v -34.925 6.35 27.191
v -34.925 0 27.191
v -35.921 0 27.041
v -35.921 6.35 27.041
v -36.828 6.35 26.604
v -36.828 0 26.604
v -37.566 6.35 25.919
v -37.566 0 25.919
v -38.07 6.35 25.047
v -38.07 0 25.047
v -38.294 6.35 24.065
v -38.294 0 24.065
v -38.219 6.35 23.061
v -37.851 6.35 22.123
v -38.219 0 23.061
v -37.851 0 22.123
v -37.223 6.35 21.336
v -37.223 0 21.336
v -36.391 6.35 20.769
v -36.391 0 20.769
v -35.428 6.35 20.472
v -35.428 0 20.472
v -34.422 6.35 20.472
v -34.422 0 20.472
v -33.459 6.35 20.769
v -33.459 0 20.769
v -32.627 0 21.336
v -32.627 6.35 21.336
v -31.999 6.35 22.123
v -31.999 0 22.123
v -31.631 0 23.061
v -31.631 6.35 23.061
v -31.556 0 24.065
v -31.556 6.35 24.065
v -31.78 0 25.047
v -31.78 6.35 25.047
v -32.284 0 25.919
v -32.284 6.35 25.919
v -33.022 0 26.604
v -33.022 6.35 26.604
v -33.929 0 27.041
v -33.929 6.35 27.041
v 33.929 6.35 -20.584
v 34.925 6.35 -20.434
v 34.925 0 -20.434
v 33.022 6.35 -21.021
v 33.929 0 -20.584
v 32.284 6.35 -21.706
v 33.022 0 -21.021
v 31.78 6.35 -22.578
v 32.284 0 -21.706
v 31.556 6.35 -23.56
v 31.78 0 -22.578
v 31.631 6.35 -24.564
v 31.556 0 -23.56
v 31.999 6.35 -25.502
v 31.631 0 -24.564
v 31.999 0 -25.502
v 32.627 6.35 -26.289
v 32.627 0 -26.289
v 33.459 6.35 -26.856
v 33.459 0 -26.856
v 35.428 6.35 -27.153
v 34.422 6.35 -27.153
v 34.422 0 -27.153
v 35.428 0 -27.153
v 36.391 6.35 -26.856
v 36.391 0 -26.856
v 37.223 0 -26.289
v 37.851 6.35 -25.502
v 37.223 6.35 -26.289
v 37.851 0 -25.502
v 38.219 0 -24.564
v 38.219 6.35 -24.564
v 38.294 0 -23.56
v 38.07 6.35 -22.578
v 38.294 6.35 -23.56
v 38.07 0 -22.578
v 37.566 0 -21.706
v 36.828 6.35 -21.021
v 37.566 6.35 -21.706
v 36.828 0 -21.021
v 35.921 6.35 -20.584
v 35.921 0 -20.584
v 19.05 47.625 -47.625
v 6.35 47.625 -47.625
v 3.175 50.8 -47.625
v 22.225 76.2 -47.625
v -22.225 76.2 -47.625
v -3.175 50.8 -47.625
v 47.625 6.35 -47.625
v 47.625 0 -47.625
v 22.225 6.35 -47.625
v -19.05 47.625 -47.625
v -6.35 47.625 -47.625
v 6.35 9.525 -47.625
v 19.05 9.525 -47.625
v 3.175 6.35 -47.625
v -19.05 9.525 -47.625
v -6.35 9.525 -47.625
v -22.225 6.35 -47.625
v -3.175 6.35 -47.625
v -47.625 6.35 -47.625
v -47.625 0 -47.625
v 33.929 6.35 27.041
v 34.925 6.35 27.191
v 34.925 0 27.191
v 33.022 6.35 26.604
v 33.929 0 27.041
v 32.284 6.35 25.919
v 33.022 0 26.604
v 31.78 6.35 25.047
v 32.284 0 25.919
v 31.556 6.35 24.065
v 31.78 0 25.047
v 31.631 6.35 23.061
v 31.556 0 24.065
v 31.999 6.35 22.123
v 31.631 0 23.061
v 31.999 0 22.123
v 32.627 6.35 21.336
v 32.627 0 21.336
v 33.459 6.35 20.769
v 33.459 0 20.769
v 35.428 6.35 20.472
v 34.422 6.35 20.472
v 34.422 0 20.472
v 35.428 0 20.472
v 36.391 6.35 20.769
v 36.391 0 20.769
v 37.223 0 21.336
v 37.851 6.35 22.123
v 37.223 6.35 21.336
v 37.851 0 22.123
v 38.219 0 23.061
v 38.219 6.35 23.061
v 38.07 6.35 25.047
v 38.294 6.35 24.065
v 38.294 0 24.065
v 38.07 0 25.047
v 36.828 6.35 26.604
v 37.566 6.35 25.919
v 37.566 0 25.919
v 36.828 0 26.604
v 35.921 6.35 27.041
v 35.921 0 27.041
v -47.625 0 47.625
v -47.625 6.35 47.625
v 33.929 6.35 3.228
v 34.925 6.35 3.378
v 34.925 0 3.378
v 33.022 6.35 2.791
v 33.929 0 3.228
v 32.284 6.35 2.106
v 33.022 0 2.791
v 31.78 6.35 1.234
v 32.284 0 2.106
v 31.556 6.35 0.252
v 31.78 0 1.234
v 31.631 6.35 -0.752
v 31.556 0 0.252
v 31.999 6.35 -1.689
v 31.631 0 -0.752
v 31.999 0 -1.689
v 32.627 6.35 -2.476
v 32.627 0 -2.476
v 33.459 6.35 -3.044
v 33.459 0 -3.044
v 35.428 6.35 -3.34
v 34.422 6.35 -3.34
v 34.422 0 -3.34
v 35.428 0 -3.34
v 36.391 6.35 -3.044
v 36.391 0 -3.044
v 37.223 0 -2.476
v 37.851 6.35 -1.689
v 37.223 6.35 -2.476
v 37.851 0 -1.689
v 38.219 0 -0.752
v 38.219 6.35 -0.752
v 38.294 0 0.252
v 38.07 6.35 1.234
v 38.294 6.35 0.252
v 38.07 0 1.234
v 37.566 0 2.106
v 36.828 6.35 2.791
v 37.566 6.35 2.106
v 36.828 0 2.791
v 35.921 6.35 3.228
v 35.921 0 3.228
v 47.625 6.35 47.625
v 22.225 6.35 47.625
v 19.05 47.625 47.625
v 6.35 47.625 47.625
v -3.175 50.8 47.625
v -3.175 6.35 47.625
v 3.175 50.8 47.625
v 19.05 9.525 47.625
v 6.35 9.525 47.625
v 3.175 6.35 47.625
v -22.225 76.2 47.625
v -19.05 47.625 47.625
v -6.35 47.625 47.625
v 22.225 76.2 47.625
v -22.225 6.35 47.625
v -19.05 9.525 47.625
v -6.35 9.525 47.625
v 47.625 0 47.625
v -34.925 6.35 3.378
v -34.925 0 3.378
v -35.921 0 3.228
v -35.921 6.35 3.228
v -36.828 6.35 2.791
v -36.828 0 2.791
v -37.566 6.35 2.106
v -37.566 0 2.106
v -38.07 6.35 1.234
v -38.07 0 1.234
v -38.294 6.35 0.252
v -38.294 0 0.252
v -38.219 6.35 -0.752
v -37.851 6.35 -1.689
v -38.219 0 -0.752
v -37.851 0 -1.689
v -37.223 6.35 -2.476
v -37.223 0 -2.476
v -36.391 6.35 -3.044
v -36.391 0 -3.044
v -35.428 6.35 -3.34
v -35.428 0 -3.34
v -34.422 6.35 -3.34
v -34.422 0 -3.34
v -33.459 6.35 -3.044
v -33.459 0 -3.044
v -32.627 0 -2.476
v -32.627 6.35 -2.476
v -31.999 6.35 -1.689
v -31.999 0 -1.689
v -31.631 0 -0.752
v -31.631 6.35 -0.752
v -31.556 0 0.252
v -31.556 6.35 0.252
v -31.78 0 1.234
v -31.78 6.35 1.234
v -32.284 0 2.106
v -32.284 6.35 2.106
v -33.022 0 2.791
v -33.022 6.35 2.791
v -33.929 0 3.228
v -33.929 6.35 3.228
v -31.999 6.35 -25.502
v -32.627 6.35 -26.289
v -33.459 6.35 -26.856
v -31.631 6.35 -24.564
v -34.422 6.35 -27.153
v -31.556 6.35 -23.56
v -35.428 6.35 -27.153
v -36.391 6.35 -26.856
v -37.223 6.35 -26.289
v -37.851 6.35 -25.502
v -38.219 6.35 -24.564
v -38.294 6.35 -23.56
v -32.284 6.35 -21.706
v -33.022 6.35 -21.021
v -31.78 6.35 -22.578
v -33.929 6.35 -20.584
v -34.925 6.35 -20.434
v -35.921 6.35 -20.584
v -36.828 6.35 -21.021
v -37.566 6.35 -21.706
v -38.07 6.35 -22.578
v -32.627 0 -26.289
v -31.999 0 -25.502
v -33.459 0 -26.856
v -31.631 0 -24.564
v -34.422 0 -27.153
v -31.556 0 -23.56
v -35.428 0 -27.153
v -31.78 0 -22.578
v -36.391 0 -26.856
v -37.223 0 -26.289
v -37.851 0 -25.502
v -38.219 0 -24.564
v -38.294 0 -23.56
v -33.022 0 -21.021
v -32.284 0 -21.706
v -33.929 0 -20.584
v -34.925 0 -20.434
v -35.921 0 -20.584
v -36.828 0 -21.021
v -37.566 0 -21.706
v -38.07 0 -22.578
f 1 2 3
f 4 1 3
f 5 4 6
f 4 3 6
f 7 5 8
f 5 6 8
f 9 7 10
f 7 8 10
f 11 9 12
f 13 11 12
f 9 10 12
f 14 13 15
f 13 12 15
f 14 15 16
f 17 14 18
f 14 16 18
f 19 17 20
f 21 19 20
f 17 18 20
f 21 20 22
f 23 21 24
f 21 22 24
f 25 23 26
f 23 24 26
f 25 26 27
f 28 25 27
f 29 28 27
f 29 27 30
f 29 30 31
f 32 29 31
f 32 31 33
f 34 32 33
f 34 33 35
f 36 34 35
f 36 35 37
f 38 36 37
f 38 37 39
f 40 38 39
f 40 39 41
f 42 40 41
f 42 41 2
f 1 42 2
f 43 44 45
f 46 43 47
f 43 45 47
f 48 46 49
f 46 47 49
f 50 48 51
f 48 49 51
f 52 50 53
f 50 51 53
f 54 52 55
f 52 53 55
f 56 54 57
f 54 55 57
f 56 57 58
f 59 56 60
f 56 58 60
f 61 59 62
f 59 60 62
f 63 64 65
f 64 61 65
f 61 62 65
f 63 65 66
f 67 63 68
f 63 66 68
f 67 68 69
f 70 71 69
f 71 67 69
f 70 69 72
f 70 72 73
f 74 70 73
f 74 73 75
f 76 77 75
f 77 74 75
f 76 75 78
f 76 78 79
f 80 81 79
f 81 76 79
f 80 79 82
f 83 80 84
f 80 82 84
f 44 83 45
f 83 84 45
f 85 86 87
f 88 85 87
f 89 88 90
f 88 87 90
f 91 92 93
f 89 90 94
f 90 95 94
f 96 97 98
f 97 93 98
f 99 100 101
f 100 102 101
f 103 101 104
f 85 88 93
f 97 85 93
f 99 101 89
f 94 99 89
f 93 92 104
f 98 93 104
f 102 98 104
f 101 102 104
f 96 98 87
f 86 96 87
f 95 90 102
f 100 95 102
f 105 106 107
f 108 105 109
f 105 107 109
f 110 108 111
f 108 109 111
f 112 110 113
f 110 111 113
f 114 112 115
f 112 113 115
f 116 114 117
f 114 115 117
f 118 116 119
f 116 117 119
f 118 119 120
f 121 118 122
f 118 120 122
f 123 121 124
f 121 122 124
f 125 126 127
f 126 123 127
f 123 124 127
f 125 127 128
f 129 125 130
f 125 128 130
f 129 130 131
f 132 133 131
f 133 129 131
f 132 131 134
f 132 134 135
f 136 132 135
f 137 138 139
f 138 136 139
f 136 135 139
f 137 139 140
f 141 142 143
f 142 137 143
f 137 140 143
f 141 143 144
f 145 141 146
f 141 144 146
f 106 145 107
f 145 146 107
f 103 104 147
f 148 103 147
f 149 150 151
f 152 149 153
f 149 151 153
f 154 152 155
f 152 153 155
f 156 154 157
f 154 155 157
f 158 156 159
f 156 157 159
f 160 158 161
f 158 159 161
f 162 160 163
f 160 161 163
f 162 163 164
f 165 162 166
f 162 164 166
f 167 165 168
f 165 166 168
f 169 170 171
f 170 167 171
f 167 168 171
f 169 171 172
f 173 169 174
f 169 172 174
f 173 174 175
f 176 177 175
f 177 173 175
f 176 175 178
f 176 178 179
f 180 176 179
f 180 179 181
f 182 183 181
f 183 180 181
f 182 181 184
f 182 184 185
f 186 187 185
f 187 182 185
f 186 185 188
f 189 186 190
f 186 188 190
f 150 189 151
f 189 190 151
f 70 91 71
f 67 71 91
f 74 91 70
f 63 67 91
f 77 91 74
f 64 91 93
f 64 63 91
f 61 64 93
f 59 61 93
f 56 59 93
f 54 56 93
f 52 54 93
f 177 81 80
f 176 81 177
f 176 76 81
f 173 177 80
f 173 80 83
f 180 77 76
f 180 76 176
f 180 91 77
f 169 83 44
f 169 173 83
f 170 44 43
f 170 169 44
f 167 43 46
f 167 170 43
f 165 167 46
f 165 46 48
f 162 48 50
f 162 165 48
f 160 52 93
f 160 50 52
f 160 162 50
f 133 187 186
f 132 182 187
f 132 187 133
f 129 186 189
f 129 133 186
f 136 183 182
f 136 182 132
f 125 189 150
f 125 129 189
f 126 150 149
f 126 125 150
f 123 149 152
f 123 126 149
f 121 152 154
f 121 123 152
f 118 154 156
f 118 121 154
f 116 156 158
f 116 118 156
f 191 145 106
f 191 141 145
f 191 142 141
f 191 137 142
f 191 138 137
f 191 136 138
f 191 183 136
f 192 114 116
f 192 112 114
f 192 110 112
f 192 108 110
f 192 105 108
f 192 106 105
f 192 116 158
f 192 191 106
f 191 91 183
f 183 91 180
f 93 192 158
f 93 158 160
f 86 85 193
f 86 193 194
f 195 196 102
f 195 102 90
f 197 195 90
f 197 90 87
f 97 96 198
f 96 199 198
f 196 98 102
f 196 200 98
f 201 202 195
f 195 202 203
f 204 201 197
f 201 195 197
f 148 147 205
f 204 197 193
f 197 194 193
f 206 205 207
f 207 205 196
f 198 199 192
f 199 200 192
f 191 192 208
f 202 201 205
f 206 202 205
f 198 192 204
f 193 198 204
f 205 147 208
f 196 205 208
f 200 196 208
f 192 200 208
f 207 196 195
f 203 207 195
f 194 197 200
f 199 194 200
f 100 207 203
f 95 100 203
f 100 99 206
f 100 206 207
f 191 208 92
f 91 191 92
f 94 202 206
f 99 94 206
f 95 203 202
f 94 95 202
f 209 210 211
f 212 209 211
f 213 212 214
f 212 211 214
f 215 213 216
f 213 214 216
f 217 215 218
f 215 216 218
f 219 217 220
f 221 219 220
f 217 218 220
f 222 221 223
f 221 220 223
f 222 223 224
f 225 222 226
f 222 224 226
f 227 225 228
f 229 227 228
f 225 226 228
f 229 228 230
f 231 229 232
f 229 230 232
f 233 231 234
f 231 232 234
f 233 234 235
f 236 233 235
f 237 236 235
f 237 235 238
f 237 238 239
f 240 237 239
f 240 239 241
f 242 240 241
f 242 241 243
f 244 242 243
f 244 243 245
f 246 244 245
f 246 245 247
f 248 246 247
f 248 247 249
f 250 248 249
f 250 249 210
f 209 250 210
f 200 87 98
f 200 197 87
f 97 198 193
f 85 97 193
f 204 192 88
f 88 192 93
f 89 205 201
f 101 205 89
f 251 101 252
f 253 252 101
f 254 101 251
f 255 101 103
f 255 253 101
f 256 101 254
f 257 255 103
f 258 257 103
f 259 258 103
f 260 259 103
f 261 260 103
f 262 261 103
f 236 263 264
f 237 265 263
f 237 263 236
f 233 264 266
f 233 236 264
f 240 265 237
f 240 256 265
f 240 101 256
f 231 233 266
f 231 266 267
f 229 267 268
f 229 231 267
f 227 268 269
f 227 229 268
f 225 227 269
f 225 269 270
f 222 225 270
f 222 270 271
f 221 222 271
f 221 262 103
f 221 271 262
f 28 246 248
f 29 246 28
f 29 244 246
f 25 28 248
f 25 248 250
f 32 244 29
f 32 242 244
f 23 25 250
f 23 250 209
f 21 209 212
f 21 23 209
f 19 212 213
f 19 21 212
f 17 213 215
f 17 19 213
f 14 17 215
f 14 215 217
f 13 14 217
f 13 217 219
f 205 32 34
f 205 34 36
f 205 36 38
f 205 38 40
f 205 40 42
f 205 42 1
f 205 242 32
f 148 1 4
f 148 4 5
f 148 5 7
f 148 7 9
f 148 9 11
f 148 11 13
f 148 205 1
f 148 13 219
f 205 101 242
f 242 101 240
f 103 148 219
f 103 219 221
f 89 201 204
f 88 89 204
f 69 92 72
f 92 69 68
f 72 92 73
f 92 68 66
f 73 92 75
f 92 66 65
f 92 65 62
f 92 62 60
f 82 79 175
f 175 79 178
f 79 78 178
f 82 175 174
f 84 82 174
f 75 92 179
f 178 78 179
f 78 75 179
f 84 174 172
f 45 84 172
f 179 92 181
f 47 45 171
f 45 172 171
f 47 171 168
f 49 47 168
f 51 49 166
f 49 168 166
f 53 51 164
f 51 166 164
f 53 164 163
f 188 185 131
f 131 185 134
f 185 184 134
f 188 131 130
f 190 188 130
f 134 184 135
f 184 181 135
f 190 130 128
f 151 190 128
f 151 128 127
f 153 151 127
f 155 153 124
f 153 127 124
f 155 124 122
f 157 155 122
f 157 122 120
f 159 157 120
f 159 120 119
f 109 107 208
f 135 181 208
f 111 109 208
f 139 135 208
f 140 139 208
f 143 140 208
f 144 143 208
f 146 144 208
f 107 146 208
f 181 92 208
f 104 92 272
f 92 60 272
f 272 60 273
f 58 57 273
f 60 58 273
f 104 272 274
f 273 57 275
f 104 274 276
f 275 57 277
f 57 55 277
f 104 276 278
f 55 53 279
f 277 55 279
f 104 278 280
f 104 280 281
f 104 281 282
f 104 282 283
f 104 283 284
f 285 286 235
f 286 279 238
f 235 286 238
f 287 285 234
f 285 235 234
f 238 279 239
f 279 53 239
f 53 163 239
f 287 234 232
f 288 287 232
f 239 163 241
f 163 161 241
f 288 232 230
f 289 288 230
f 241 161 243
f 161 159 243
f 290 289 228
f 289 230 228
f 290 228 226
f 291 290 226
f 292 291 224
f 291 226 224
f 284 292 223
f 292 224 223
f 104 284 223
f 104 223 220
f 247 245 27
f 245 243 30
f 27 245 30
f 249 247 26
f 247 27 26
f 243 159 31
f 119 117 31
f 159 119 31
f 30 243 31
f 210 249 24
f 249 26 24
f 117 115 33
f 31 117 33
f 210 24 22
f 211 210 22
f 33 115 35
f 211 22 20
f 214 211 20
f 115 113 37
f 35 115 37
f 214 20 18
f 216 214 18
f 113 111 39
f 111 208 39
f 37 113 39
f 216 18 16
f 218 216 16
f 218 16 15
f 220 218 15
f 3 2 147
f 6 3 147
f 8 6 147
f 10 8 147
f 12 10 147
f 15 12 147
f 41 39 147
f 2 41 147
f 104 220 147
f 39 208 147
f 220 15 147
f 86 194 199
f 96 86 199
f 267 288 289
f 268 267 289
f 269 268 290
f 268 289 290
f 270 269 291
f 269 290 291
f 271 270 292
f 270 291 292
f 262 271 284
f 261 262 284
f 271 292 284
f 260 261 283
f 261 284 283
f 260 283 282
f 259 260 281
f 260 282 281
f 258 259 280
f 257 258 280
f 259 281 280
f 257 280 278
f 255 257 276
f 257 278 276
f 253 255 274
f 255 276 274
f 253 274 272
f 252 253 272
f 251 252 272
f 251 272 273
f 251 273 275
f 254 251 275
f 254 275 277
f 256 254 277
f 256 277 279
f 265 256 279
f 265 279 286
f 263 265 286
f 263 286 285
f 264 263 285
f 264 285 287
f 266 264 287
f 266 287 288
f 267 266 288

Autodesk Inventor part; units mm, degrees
ref_plane "XZ Plane" through (0, 0, 0) normal (0, 1, 0) x (-1, 0, 0)
ref_plane "XY Plane" through (0, 0, 0) normal (0, 0, 1) x (1, 0, 0)
sketch "Sketch1" plane through (0, 0, 0) normal (0, 1, 0) x (-1, 0, 0)
  line L0 (47.625, 47.625) -> (-47.625, 47.625)
  line L1 (-47.625, 47.625) -> (-47.625, -47.625)
  line L2 (-47.625, -47.625) -> (47.625, -47.625)
  line L3 (47.625, -47.625) -> (47.625, 47.625)
  line L4 (47.625, 47.625) -> (-47.625, -47.625) construction
  line L5 (-47.625, 47.625) -> (47.625, -47.625) construction
  point P0 (0, 0)
  dimension "d0" = 95.25
  dimension "d1" = 95.25
extrude "Extrusion1" add sketch "Sketch1" along normal blind 6.35
sketch "Sketch2" plane through (-47.625, 0, 47.625) normal (0, 0, 1) x (1, 0, 0)
  line L0 (0, 6.35) -> (95.25, 6.35) projected
  line L1 (25.4, 6.35) -> (44.45, 6.35)
  line L2 (44.45, 6.35) -> (44.45, 50.8)
  line L3 (44.45, 50.8) -> (25.4, 50.8)
  line L4 (25.4, 50.8) -> (25.4, 6.35)
  line L5 (50.8, 6.35) -> (69.85, 6.35)
  line L6 (69.85, 6.35) -> (69.85, 50.8)
  line L7 (69.85, 50.8) -> (50.8, 50.8)
  line L8 (50.8, 50.8) -> (50.8, 6.35)
  line L9 (0, 0) -> (0, 6.35) projected
  line L10 (28.575, 9.525) -> (41.275, 9.525)
  line L11 (41.275, 9.525) -> (41.275, 47.625)
  line L12 (41.275, 47.625) -> (28.575, 47.625)
  line L13 (28.575, 47.625) -> (28.575, 9.525)
  line L14 (28.575, 9.525) -> (41.275, 47.625) construction
  line L15 (41.275, 9.525) -> (28.575, 47.625) construction
  line L16 (53.975, 9.525) -> (66.675, 9.525)
  line L17 (66.675, 9.525) -> (66.675, 47.625)
  line L18 (66.675, 47.625) -> (53.975, 47.625)
  line L19 (53.975, 47.625) -> (53.975, 9.525)
  line L20 (53.975, 9.525) -> (66.675, 47.625) construction
  line L21 (66.675, 9.525) -> (53.975, 47.625) construction
  point P0 (47.625, 0)
  point P1 (34.925, 28.575)
  point P2 (60.325, 28.575)
  dimension "d4" = 19.05
  dimension "d5" = 44.45
  dimension "d6" = 6.35
  dimension "d7" = 25.4
  dimension "d8" = 3.175
  dimension "d9" = 3.175
  dimension "d10" = 3.175
  dimension "d11" = 3.175
  dimension "d12" = 3.175
  dimension "d13" = 3.175
extrude "Extrusion2" add sketch "Sketch2" against normal blind 95.25
sketch "Sketch3" plane through (-22.225, 50.8, 47.625) normal (0, 1, 0) x (1, 0, 0)
  line L0 (0, 0) -> (0, 95.25) projected
  line L1 (0, 0) -> (44.45, 0)
  line L2 (44.45, 0) -> (44.45, 95.25)
  line L3 (44.45, 95.25) -> (0, 95.25)
  line L4 (0, 95.25) -> (0, 0)
  point P0 (22.225, 47.625)
extrude "Extrusion3" add sketch "Sketch3" along normal blind 25.4
sketch "Sketch4" plane through (0, 6.35, 0) normal (0, 1, 0) x (1, 0, 0)
  line L0 (-47.625, -47.625) -> (47.625, -47.625) construction
  line L1 (-34.925, -47.625) -> (-34.925, 47.625) construction
  line L2 (-47.625, 47.625) -> (-47.625, -47.625) projected
  line L3 (34.925, -47.625) -> (34.925, 47.625) construction
  line L4 (47.625, -47.625) -> (47.625, 47.625) construction
  point P0 (0, 0)
  point P1 (-34.925, -23.8125)
  point P2 (-34.925, 0)
  point P3 (-34.925, 23.8125)
  dimension "d18" = 12.7
  dimension "d19" = 12.7
  dimension "d20" = 23.8125
  dimension "d21" = 23.8125
  dimension "d22" = 23.8125
hole "Hole1" at (-34.925, 6.35, 23.8125) at (-34.925, 6.35, 0) at (-34.925, 6.35, -23.8125) direction (0, -1, 0) diameter 6.7564 end through all clearance for "Flat Head Machine Screw (82)" size "1/4" standard "Ansi Unified Screw Threads"
mirror "Mirror1" about plane through (0, 0, 0) normal (1, 0, 0) of "Hole1"
equation "\"d0\" = width"
equation "\"d1\" = length"
equation "\"d2\" = thickness"
equation "\"d4\" = tubeWidth"
equation "\"d5\" = tubeLength"
equation "\"d8\" = tubeWallThickness"
equation "\"d9\" = tubeWallThickness"
equation "\"d10\" = tubeWallThickness"
equation "\"d11\" = tubeWallThickness"
equation "\"d12\" = tubeWallThickness"
equation "\"d13\" = tubeWallThickness"
equation "\"d14\" = length"
equation "\"length\" = 95.25"
equation "\"width\" = 95.25"
equation "\"thickness\" = 6.35"
equation "\"tubeLength\" = 44.45"
equation "\"tubeWidth\" = 19.05"
equation "\"tubeWallThickness\" = 3.175"
properties part number "SupportForMotorMountV02"
